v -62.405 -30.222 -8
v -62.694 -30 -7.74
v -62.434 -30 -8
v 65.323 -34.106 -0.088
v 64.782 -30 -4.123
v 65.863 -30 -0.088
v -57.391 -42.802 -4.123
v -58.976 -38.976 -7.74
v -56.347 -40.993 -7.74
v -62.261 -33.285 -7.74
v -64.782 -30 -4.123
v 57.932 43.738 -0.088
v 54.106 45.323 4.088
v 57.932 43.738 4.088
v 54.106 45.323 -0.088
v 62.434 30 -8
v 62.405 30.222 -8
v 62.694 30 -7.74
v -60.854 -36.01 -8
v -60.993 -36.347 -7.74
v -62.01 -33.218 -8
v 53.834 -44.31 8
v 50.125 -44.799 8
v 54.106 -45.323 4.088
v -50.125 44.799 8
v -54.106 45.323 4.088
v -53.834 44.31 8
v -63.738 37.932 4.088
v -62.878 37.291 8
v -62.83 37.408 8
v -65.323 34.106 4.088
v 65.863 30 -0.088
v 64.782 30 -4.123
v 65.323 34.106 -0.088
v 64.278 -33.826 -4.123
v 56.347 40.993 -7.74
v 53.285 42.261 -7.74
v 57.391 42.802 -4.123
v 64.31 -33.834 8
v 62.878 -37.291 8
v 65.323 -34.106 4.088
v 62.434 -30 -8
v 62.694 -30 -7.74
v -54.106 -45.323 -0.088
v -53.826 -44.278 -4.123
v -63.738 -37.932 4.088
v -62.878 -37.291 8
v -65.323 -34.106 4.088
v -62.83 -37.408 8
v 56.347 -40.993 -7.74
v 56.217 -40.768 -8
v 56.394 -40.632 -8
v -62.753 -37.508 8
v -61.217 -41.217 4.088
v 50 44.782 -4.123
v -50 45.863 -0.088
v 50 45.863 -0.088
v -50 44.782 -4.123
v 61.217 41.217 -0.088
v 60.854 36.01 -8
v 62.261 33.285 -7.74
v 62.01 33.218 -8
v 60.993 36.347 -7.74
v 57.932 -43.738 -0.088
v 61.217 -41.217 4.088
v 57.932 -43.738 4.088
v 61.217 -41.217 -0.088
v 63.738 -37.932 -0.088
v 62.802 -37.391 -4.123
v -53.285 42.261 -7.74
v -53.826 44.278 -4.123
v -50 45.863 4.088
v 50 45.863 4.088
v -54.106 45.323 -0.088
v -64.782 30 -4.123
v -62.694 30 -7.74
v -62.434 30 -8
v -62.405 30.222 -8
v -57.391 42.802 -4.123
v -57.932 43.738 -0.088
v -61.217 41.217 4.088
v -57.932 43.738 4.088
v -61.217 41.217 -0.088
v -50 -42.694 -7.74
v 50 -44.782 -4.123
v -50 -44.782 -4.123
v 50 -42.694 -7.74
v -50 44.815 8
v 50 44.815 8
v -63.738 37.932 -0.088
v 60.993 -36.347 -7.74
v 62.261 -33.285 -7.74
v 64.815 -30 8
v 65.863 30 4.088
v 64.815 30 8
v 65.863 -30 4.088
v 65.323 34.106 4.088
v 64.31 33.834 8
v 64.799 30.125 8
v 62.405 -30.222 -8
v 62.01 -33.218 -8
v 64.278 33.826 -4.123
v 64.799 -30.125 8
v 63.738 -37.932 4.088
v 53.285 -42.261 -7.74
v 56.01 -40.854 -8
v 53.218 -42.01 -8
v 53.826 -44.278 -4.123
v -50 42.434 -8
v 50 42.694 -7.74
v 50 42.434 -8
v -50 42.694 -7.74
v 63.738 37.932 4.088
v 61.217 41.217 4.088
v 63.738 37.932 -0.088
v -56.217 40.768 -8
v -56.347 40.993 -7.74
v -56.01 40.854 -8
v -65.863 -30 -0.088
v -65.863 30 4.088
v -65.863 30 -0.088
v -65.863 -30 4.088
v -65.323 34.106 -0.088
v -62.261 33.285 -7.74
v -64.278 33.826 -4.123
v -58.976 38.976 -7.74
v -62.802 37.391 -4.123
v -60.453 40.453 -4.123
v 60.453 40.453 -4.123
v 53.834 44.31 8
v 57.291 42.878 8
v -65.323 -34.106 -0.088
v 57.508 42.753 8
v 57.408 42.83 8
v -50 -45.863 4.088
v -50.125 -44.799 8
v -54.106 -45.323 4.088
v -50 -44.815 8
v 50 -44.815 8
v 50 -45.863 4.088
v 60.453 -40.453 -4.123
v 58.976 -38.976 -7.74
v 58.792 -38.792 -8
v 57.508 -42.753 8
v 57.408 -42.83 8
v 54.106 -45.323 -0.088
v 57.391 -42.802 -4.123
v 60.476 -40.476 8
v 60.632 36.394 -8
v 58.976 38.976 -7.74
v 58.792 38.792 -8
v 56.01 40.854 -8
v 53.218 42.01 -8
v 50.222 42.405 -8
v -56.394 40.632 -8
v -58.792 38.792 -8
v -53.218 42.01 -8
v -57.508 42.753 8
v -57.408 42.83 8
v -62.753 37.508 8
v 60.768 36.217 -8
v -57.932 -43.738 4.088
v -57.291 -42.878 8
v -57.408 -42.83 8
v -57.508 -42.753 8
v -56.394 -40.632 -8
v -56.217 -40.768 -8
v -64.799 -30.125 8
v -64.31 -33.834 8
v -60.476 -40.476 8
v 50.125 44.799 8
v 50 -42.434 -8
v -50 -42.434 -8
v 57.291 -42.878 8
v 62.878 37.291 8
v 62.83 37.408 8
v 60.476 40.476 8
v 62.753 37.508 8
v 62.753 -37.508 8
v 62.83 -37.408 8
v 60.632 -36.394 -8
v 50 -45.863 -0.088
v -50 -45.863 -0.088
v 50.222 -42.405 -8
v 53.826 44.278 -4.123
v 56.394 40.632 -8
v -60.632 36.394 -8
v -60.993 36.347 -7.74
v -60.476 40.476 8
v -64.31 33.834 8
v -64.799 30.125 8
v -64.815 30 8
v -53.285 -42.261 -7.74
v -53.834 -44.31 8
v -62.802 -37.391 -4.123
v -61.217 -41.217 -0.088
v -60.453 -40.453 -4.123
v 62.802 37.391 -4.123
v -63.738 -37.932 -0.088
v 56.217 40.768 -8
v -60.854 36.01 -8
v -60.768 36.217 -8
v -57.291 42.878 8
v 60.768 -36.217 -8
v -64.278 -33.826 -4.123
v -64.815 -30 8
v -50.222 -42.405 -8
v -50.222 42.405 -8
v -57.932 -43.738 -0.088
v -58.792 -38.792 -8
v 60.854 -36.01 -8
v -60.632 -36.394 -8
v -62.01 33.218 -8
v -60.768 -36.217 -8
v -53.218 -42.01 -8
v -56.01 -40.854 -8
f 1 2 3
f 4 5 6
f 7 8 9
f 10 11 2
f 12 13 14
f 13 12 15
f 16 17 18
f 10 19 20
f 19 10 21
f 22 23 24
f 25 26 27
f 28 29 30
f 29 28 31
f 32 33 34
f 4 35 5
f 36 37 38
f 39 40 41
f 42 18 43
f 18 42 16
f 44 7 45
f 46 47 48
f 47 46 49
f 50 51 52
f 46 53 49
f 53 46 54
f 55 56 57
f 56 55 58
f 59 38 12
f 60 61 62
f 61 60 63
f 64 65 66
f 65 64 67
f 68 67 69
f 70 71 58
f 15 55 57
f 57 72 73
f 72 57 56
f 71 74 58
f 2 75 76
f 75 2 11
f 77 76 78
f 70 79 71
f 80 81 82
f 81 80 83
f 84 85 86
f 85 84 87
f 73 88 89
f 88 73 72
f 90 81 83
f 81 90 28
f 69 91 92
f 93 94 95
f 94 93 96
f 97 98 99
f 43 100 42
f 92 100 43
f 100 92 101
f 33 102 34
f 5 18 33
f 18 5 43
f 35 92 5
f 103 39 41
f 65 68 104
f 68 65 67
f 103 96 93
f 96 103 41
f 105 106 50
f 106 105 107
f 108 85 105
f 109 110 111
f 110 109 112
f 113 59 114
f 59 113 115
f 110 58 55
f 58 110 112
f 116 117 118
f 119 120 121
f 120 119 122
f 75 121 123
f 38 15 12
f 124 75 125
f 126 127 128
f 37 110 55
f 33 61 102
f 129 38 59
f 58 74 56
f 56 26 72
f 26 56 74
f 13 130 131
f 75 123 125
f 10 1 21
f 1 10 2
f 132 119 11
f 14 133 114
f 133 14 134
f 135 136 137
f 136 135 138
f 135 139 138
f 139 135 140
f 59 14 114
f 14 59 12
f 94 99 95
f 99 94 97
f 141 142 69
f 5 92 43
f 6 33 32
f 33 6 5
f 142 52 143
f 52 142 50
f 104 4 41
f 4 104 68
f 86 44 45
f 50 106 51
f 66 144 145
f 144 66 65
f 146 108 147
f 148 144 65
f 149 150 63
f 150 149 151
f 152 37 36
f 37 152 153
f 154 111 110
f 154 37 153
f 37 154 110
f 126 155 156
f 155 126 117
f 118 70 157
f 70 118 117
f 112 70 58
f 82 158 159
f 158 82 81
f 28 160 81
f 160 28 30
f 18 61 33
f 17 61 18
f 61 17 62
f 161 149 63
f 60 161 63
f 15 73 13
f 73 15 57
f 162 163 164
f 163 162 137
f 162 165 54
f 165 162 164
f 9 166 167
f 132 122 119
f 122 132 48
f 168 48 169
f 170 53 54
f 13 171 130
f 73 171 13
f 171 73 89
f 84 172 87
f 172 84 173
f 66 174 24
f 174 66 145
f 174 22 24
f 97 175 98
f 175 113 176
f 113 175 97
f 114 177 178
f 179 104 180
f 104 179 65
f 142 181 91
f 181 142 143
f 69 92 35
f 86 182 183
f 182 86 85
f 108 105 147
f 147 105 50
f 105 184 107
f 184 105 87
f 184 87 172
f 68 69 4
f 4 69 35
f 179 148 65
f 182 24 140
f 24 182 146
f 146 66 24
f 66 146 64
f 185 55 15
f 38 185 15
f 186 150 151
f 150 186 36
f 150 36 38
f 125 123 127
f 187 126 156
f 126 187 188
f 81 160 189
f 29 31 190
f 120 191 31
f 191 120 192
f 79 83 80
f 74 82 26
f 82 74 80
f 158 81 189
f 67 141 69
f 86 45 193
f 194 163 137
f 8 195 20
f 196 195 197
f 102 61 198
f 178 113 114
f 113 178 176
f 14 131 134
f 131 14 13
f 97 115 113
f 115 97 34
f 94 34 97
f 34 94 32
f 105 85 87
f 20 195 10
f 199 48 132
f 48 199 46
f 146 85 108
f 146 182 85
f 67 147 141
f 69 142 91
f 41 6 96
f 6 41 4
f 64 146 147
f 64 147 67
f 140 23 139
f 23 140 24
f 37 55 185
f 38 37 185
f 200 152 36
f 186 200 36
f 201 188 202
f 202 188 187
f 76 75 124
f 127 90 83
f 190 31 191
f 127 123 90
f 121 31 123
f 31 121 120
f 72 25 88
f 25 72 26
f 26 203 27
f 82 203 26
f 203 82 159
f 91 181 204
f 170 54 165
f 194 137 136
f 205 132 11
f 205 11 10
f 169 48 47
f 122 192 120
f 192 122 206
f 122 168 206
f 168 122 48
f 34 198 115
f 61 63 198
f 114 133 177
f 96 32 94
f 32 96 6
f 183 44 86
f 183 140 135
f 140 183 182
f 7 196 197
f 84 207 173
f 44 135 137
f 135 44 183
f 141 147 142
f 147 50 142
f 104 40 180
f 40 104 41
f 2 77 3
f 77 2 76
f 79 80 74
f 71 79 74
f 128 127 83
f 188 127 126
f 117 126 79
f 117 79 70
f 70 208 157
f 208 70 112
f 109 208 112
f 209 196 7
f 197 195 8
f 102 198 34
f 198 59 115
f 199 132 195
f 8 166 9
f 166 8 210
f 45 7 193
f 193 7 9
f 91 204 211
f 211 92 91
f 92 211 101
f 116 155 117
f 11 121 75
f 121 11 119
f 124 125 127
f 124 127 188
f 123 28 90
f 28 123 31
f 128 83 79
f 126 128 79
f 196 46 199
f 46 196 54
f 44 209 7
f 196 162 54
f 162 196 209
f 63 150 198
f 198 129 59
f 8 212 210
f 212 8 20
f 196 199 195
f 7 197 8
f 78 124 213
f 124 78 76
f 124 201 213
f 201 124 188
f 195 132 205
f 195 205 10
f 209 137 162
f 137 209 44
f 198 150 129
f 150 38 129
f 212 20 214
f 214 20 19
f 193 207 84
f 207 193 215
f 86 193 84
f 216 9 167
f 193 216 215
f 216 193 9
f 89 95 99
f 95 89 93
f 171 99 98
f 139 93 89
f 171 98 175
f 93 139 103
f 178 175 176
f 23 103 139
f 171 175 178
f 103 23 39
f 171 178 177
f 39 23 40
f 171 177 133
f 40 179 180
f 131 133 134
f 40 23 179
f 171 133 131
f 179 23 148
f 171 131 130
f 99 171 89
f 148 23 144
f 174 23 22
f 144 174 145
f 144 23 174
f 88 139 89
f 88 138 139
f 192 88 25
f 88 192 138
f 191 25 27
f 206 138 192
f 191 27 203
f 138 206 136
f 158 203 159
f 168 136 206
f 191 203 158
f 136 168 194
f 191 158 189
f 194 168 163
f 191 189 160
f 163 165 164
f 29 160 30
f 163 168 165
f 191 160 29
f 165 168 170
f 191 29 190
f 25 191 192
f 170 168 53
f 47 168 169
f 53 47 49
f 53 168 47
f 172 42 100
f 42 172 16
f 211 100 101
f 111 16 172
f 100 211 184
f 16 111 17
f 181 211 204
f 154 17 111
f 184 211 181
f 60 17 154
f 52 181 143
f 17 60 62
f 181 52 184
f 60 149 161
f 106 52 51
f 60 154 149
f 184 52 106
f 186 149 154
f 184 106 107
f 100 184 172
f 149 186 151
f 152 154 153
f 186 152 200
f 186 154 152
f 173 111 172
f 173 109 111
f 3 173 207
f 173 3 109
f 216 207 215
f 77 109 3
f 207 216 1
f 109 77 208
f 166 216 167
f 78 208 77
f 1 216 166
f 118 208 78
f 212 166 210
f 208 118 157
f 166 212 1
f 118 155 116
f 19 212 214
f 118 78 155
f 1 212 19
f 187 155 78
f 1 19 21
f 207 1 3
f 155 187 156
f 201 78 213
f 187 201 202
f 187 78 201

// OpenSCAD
$fn=24;

h=16;
l=60;
w=100;
intersection() {
hull() for(x=[-w/2,w/2]) for(y=[-l/2,l/2]) translate([x,y,h/8]) sphere(r=h,center=true);
cube([2*w,2*l,h],true);
}
